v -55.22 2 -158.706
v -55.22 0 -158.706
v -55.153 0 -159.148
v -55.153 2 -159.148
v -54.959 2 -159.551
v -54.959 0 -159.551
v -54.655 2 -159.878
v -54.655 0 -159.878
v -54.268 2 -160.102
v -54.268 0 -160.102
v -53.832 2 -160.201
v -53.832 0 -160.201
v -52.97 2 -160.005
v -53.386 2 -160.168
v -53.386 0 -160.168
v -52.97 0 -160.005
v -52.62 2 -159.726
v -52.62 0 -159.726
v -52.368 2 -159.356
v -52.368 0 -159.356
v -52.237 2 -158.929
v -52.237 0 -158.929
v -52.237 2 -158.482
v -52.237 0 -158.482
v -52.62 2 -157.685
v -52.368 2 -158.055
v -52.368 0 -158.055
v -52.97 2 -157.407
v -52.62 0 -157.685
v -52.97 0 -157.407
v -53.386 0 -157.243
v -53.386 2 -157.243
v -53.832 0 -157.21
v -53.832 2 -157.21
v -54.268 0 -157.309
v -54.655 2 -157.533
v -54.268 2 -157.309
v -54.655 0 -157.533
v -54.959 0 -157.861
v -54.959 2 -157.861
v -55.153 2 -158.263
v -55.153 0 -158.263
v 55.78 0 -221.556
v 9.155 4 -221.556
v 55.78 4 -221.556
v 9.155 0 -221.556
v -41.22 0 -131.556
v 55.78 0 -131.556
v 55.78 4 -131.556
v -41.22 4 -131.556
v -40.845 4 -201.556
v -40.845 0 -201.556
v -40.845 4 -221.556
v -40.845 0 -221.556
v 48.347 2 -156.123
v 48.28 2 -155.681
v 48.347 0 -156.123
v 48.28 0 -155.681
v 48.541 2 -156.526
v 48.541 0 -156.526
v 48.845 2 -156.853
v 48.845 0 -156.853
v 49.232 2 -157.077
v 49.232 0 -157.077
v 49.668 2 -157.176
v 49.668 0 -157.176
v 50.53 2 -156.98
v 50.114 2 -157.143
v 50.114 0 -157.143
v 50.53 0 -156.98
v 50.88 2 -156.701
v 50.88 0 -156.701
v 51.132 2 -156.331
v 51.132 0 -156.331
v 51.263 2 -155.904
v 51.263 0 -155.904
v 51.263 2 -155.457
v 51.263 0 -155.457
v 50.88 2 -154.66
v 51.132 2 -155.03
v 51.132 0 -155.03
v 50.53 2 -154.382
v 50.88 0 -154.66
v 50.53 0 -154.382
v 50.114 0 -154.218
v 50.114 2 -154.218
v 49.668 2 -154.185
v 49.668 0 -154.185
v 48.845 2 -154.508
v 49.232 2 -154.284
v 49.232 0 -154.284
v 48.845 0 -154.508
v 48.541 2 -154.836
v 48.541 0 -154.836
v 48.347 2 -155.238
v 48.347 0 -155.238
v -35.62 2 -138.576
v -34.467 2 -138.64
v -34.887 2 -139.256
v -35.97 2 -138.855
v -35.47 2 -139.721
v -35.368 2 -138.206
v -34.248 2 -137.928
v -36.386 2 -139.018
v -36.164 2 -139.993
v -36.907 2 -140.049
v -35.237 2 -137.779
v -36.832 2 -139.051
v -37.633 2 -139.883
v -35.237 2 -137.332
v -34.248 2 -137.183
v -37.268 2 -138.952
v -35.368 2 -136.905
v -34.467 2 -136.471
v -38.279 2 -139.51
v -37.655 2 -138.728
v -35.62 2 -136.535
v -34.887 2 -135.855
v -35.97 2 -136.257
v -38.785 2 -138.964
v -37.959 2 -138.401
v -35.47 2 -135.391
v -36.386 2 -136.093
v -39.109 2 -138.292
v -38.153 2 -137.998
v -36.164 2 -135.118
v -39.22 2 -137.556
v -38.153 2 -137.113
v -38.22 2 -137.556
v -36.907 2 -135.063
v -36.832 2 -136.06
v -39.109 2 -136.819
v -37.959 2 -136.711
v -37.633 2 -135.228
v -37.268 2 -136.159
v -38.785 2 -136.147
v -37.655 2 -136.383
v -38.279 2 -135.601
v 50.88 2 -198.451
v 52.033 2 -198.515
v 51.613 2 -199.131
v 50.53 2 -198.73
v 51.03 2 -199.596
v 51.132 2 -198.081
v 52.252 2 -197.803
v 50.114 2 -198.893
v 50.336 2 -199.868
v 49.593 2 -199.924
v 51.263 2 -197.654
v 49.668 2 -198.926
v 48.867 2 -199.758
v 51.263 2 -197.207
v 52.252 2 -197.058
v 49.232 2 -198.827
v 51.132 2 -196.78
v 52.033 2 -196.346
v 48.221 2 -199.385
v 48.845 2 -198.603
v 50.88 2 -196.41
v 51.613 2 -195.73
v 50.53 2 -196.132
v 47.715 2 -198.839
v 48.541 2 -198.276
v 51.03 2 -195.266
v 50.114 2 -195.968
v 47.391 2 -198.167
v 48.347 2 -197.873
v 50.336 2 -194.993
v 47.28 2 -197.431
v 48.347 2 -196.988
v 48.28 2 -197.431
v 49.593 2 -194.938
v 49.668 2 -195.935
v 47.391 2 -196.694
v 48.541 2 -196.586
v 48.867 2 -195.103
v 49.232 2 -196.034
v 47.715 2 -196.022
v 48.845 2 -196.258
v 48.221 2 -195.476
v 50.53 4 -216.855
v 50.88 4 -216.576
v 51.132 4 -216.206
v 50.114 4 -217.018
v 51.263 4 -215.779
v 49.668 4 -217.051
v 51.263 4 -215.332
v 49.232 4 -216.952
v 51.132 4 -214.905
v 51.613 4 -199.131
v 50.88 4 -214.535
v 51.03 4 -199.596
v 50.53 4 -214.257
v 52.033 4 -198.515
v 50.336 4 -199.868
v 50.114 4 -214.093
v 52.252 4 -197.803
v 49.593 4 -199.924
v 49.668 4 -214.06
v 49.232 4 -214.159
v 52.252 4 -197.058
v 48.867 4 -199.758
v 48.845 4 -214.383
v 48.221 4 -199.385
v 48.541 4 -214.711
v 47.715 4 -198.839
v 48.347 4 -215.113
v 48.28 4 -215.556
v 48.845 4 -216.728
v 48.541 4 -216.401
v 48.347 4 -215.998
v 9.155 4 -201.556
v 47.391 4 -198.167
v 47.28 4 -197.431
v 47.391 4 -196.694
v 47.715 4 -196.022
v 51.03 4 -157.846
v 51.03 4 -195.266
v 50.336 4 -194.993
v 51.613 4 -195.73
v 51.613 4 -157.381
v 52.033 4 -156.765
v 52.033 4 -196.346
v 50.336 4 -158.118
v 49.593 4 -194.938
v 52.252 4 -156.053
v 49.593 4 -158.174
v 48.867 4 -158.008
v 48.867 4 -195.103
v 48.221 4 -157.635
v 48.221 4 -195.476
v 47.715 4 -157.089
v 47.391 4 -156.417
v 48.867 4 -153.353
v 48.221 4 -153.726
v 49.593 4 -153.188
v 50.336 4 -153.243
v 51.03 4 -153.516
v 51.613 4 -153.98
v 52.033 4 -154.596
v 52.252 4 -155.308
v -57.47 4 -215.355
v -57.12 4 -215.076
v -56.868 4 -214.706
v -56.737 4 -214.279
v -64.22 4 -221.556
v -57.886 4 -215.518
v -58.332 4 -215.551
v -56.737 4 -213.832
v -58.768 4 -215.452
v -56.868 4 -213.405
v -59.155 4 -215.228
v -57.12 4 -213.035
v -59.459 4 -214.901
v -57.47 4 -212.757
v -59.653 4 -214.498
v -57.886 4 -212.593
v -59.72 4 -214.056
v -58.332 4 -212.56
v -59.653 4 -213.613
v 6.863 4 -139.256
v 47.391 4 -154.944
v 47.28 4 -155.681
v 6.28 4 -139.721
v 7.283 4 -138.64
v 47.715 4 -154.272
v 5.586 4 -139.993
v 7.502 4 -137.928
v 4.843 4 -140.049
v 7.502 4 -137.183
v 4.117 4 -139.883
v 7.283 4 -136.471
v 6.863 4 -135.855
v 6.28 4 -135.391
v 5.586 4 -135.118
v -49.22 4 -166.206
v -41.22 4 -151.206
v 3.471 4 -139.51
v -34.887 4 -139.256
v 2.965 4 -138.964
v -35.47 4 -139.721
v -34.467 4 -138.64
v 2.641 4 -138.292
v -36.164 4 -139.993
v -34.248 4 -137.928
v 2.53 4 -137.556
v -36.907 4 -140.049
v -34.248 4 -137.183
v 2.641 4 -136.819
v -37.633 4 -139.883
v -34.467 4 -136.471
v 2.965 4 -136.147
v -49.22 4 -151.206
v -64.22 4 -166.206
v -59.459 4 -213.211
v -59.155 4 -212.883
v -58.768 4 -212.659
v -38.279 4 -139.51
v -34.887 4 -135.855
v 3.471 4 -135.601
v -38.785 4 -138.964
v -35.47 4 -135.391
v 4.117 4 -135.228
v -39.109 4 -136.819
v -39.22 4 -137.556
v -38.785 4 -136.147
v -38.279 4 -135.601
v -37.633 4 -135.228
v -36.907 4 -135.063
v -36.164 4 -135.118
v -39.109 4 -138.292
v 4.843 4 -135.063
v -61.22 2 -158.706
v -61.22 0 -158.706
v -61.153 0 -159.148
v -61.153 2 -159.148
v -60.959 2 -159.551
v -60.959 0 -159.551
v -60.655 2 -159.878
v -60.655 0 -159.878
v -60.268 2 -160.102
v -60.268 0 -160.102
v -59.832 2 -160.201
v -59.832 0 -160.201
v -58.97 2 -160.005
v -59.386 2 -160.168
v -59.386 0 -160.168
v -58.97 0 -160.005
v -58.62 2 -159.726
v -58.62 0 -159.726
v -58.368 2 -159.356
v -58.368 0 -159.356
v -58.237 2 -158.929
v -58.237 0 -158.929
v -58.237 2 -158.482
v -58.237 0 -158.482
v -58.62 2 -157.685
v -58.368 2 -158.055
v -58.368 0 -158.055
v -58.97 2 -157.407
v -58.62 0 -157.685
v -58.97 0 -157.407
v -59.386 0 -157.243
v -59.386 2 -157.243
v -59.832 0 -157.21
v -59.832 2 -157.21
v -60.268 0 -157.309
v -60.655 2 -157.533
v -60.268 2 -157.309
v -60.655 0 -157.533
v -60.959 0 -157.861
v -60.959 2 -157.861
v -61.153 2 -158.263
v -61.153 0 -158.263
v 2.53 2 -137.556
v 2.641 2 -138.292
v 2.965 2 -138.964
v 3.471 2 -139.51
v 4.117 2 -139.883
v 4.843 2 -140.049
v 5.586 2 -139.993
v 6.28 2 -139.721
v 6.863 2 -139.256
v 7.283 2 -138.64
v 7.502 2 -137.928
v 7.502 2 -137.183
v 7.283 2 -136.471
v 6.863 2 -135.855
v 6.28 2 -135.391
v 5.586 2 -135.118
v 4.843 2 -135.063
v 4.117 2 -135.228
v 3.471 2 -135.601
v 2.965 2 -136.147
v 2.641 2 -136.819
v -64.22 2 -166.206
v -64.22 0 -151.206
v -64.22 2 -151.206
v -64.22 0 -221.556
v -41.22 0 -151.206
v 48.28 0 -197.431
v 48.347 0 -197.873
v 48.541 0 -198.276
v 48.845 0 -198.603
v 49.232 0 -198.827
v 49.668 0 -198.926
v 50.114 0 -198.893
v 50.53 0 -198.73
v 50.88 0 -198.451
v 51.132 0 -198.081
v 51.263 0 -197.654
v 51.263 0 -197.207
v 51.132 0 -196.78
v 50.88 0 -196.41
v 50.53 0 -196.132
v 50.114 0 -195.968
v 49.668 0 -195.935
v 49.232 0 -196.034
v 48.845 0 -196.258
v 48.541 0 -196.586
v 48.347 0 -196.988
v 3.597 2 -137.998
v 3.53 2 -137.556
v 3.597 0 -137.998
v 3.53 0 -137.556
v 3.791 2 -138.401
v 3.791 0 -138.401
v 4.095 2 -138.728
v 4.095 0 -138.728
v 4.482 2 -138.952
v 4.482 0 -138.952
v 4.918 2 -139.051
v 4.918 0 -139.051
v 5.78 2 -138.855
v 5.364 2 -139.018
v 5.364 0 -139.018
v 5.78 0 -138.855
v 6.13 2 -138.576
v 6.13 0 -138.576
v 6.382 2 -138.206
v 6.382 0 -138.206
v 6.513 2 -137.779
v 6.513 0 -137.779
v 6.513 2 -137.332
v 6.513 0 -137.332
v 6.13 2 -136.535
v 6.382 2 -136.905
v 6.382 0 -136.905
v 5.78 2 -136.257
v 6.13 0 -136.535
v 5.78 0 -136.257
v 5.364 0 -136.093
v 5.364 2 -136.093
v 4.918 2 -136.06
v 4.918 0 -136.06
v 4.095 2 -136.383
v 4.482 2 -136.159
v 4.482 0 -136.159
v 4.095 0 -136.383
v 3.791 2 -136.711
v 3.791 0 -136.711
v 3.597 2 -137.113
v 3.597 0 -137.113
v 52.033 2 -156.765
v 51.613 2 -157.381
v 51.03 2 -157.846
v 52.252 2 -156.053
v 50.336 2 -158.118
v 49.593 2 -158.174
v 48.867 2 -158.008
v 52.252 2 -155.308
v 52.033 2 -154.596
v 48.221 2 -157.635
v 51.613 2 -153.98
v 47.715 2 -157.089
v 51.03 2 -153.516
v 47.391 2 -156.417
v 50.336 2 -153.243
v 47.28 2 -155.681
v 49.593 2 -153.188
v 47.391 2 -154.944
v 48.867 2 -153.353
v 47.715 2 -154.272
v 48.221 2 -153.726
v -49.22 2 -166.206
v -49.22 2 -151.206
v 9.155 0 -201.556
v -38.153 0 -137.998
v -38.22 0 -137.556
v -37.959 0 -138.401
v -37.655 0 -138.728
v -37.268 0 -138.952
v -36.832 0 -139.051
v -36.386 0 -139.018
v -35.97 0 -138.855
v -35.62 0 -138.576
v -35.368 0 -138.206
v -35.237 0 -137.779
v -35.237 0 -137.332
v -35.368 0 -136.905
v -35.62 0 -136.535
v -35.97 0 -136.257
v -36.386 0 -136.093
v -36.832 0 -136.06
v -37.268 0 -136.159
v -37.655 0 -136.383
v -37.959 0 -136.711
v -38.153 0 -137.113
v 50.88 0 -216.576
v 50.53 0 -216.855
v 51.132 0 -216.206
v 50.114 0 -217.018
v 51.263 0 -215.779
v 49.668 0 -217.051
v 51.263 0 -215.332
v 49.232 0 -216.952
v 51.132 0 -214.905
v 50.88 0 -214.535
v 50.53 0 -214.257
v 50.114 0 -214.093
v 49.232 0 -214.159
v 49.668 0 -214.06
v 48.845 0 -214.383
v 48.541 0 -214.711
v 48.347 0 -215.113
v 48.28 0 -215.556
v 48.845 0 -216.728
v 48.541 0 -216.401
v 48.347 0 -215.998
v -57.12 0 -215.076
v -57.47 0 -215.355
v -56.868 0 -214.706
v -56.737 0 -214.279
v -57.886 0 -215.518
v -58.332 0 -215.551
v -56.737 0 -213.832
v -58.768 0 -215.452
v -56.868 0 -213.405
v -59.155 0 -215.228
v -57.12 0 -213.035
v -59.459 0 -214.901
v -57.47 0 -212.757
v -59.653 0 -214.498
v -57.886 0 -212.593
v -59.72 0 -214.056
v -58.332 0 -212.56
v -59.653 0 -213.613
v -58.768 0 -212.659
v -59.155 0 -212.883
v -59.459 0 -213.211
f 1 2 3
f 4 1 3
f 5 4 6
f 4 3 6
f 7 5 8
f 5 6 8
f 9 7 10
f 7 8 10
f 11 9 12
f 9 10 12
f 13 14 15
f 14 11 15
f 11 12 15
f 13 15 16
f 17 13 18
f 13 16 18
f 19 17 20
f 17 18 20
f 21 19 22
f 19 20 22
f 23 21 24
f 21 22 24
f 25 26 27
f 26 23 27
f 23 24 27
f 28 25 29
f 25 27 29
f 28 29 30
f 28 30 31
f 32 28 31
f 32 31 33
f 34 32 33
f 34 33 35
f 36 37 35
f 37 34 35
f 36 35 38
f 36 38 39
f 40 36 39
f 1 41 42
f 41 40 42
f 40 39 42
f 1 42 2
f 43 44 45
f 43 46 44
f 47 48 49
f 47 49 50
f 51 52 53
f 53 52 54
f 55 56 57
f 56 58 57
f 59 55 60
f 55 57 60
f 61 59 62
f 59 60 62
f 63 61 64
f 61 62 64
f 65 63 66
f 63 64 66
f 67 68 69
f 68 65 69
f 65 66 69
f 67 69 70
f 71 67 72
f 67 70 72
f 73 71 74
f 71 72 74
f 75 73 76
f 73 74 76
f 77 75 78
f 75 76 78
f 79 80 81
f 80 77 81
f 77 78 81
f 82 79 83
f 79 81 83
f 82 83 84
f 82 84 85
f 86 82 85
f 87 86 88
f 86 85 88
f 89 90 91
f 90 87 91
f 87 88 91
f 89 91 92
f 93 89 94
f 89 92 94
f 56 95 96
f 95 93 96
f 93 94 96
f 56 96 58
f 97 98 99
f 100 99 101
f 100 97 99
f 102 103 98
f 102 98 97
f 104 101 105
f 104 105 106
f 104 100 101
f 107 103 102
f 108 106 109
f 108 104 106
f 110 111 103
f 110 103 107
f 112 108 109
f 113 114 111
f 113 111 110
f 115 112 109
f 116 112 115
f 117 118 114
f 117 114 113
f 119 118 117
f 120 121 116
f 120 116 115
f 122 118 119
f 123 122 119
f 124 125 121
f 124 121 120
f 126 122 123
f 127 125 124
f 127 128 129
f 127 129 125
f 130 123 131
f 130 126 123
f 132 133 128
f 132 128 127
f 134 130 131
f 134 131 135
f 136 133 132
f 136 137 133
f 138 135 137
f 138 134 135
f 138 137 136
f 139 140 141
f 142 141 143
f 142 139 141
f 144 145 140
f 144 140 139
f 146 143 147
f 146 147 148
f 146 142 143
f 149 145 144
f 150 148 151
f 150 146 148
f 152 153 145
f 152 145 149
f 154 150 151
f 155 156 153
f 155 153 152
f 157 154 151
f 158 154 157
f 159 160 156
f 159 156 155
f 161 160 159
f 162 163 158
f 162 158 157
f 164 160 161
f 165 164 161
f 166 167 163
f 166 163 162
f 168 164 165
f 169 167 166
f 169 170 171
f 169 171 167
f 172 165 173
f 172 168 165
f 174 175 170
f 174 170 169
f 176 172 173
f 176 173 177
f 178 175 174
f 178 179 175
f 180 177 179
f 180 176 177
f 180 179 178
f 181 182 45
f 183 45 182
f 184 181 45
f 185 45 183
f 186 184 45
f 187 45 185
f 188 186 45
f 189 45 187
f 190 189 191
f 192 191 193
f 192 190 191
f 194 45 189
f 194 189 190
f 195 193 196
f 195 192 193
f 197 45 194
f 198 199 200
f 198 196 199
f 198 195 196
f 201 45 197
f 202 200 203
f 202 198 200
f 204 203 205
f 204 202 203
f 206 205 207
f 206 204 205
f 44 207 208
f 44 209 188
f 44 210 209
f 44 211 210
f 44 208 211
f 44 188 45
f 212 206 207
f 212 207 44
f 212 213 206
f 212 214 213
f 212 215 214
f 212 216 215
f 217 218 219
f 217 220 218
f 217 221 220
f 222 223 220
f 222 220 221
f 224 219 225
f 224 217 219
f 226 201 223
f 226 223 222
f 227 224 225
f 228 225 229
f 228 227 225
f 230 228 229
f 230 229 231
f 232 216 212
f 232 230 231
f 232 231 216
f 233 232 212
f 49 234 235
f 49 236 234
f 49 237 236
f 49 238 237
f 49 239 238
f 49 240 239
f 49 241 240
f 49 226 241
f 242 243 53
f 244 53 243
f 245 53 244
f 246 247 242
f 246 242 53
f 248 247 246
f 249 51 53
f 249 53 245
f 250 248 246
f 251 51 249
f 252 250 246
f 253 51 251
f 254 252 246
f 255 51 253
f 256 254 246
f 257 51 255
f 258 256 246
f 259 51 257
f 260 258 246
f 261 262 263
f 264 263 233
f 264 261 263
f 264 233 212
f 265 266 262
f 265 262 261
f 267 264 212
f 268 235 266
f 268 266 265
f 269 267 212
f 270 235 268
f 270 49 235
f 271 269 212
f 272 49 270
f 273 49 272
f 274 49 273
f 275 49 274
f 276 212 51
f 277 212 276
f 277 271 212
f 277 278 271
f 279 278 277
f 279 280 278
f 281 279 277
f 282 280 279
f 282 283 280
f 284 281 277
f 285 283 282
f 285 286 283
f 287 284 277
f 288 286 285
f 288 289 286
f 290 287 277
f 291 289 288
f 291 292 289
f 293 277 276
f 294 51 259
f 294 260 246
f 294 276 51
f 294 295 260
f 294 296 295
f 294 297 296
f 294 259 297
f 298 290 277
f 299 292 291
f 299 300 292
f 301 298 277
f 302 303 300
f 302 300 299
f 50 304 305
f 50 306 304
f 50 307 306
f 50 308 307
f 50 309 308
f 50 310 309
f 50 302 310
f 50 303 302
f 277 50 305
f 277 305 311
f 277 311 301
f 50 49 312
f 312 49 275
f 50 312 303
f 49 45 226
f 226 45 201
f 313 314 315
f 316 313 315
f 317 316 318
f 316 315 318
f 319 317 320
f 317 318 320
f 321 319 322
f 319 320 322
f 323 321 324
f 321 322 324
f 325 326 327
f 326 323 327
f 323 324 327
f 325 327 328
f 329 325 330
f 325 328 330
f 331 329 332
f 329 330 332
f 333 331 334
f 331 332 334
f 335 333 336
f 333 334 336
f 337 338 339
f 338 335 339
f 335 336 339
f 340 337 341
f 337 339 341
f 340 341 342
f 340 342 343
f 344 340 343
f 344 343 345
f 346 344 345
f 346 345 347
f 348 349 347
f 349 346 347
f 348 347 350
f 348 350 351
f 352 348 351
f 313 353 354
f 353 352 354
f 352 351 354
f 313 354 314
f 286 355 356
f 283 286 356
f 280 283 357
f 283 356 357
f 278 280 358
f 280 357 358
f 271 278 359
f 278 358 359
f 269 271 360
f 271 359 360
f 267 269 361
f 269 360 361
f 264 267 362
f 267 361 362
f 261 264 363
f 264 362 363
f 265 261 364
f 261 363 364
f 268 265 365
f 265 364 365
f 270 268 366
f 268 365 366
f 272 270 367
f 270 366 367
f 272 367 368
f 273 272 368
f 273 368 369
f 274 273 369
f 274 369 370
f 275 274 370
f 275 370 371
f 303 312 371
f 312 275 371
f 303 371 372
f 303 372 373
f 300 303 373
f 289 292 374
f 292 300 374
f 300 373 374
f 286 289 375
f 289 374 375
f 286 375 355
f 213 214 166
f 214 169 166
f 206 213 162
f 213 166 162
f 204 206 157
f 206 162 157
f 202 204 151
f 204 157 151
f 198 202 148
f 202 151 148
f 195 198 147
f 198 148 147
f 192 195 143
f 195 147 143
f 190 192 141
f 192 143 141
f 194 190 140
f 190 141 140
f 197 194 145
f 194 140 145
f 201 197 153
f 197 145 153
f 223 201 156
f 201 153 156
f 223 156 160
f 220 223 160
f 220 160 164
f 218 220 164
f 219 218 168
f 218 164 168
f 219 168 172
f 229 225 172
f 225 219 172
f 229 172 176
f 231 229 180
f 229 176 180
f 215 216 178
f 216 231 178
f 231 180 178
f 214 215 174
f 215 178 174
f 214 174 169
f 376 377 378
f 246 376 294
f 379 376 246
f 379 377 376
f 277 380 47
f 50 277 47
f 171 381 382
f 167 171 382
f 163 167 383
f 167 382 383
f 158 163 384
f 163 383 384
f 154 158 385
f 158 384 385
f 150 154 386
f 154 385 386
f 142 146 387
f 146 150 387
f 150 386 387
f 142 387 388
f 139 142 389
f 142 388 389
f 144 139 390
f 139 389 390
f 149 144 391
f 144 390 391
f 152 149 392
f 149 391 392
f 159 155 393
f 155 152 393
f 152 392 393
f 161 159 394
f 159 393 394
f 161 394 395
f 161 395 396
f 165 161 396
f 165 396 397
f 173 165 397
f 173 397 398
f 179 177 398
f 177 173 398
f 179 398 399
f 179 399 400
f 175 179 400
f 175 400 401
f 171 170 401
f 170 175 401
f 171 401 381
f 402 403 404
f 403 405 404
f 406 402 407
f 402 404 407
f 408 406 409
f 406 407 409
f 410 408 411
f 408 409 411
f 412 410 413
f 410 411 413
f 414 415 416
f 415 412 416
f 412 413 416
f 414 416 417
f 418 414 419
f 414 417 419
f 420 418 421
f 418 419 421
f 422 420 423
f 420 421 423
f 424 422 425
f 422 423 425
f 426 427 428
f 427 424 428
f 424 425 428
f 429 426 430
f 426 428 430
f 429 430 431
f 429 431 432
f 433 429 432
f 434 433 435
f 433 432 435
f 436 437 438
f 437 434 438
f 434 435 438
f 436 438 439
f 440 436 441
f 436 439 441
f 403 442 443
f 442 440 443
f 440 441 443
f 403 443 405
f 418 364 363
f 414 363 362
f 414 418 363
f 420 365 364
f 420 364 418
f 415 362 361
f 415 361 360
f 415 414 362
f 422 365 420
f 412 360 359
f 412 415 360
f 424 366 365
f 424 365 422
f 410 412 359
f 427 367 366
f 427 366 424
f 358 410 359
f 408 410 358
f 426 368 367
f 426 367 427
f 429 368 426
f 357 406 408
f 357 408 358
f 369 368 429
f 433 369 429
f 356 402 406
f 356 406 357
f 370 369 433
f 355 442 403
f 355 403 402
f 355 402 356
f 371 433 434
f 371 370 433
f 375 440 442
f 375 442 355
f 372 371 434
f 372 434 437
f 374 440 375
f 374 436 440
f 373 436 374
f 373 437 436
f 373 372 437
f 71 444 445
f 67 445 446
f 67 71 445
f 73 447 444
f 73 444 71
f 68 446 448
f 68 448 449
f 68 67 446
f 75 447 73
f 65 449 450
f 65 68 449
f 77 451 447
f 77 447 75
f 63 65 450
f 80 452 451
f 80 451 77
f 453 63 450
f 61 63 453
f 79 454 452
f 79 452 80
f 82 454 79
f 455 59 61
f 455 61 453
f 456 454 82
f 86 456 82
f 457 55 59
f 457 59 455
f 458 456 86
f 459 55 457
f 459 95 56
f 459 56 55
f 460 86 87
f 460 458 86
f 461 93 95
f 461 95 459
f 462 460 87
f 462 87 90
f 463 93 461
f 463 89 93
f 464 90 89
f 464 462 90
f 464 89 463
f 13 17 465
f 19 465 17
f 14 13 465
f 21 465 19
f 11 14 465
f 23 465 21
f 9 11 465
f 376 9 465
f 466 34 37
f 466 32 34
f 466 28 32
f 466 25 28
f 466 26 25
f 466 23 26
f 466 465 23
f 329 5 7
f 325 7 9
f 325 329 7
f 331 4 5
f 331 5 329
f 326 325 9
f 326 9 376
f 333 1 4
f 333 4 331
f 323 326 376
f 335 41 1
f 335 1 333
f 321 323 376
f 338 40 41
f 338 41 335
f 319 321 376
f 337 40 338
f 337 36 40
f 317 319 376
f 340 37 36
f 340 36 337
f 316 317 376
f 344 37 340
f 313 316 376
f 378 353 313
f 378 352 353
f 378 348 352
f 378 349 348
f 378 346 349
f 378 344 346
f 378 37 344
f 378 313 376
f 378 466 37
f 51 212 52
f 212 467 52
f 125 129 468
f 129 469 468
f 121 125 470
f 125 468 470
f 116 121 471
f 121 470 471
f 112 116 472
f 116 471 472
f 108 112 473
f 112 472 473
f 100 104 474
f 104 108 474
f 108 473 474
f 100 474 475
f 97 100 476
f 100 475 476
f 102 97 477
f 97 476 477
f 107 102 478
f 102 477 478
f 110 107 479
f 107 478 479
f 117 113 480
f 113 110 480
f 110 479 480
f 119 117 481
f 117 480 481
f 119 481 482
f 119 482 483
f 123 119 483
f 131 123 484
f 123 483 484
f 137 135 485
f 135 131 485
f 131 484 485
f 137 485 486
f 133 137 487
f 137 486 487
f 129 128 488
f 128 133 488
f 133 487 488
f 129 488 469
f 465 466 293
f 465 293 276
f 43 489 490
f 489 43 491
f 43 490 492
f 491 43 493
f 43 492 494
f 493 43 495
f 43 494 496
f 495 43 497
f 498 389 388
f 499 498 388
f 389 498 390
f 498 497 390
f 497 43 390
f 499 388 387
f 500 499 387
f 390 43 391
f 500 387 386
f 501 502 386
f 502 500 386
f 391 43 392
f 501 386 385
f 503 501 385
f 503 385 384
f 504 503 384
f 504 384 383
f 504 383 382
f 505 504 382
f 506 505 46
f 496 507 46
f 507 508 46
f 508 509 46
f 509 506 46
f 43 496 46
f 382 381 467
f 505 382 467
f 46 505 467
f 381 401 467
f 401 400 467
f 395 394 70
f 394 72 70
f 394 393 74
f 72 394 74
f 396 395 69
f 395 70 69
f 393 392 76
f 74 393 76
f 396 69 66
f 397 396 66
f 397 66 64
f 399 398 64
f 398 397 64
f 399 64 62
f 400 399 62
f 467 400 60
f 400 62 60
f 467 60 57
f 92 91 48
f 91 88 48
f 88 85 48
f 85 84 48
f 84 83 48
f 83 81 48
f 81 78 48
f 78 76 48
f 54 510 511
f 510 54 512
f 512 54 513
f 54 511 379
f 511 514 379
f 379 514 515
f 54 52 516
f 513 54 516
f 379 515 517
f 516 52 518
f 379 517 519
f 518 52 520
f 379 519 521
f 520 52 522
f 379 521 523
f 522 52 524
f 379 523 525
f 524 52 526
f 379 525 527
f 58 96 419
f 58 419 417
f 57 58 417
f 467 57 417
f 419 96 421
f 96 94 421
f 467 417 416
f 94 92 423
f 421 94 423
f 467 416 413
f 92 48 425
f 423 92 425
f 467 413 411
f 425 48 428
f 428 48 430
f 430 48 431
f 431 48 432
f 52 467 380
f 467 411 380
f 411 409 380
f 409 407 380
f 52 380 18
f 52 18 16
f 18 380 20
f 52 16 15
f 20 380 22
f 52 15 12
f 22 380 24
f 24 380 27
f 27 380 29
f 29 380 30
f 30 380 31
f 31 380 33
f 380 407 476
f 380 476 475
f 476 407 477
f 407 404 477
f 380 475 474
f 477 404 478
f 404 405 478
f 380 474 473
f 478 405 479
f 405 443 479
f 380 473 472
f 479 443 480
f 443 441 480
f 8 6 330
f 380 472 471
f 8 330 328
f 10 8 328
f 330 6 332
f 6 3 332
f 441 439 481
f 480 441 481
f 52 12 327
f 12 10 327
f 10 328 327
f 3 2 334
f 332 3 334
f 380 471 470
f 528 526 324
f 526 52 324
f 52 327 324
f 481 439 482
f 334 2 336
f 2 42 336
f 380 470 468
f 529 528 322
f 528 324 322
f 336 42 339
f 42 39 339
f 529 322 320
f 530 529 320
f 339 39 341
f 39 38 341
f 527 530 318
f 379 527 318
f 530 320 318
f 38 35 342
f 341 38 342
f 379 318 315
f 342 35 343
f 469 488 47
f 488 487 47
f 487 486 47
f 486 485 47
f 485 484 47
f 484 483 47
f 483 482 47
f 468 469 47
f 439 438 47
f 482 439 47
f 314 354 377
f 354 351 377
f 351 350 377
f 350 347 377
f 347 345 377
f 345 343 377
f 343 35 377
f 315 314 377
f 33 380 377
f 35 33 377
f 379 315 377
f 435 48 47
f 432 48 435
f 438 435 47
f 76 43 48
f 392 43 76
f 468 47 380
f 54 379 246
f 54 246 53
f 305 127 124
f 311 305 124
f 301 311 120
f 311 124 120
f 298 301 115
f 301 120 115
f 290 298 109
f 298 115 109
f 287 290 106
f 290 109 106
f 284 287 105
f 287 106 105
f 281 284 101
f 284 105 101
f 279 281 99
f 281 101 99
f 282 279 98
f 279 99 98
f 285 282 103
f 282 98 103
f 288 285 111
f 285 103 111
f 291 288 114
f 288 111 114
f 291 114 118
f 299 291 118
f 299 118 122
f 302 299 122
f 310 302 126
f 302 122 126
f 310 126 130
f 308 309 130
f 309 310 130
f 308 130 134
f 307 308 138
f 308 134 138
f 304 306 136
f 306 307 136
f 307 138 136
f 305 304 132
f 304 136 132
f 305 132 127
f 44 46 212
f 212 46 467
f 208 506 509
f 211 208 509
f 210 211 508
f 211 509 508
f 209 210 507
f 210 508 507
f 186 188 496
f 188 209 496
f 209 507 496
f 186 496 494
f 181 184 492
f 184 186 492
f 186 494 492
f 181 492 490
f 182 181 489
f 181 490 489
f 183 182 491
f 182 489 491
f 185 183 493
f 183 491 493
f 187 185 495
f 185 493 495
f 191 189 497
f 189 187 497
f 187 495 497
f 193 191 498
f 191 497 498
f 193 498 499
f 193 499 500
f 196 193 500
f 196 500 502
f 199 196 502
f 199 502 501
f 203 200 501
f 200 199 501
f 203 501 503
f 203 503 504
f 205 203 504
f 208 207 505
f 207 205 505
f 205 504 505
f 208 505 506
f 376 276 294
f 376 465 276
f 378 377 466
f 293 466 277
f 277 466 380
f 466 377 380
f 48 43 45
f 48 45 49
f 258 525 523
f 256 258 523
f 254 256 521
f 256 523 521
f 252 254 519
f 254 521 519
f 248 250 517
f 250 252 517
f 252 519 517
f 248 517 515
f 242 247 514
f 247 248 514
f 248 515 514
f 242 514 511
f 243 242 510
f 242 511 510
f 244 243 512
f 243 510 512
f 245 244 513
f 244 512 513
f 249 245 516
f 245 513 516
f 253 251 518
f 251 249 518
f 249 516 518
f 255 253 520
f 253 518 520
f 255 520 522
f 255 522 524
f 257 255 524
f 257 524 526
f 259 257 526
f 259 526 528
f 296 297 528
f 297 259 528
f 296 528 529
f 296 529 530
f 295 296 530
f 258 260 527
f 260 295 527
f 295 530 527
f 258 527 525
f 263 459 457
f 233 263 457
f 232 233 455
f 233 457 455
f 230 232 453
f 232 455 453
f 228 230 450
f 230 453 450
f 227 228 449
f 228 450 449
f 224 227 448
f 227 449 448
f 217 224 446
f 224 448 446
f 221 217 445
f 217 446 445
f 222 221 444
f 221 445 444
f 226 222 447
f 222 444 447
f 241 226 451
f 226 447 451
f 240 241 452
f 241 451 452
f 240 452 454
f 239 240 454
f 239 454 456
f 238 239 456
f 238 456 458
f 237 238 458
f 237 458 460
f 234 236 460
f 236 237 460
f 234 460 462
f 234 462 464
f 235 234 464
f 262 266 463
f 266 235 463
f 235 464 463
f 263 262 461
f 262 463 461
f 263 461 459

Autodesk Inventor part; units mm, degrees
ref_plane "YZ Plane" through (0, 0, 0) normal (1, 0, 0) x (0, 1, 0)
ref_plane "XZ Plane" through (0, 0, 0) normal (0, 1, 0) x (-1, 0, 0)
ref_plane "XY Plane" through (0, 0, 0) normal (0, 0, 1) x (1, 0, 0)
sketch "Sketch1" plane through (0, 0, 0) normal (0, 1, 0) x (-1, 0, 0)
  line L0 (64.2199, -131.5556) -> (64.2199, -221.5556)
  line L1 (3.3449, -196.5556) -> (3.3449, -176.5556)
  circle A0 centre (9.8449, -186.5556) radius 1.5
  line L2 (-9.1551, -221.5556) -> (-9.1551, -201.5556)
  circle A1 centre (21.8449, -186.5556) radius 1.5
  line L3 (3.3449, -176.5556) -> (28.3449, -176.5556)
  line L4 (28.3449, -196.5556) -> (3.3449, -196.5556)
  line L5 (28.3449, -176.5556) -> (28.3449, -196.5556)
  line L6 (64.2199, -221.5556) -> (-55.7801, -221.5556)
  line L7 (-9.1551, -201.5556) -> (40.8449, -201.5556)
  line L8 (40.8449, -221.5556) -> (-9.1551, -221.5556)
  circle A2 centre (58.2199, -214.0556) radius 1.5
  line L9 (40.8449, -201.5556) -> (40.8449, -221.5556)
  line L10 (30.8449, -173.5556) -> (15.8449, -173.5556)
  line L11 (15.8449, -173.5556) -> (15.8449, -143.5556)
  line L12 (15.8449, -143.5556) -> (30.8449, -143.5556)
  line L13 (30.8449, -143.5556) -> (30.8449, -173.5556)
  line L14 (0.8449, -173.5556) -> (15.8449, -173.5556)
  circle A3 centre (8.3449, -164.5556) radius 1.5
  circle A4 centre (8.3449, -152.5556) radius 1.5
  circle A5 centre (23.3449, -164.5556) radius 1.5
  line L15 (0.8449, -143.5556) -> (0.8449, -173.5556)
  line L16 (15.8449, -173.5556) -> (15.8449, -143.5556)
  line L17 (15.8449, -143.5556) -> (0.8449, -143.5556)
  circle A6 centre (23.3449, -152.5556) radius 1.5
  line L18 (49.2199, -166.2056) -> (64.2199, -166.2056)
  circle A7 centre (53.7199, -158.7056) radius 1.5
  circle A8 centre (53.7199, -158.7056) radius 2.5
  circle A9 centre (59.7199, -158.7056) radius 1.5
  circle A10 centre (59.7199, -158.7056) radius 2.5
  line L19 (49.2199, -151.2056) -> (49.2199, -166.2056)
  line L20 (64.2199, -166.2056) -> (64.2199, -151.2056)
  line L21 (64.2199, -151.2056) -> (49.2199, -151.2056)
  line L22 (64.2199, -148.5556) -> (64.2199, -131.5556)
  line L23 (64.2199, -131.5556) -> (49.2199, -131.5556)
  line L24 (-55.7801, -221.5556) -> (-55.7801, -131.5556)
  line L25 (-55.7801, -131.5556) -> (-6.8176, -131.5556)
  line L26 (-55.7801, -176.5556) -> (-55.7801, -171.5556)
  line L27 (-55.7801, -171.5556) -> (-55.7801, -181.5556)
  circle A11 centre (-49.7801, -215.5556) radius 1.5
  circle A12 centre (-49.7801, -155.6806) radius 1.5
  circle A13 centre (-49.7801, -155.6806) radius 2.5
  line L28 (-41.5051, -176.5556) -> (-60.5551, -176.5556) construction
  circle A14 centre (-49.7801, -197.4306) radius 2.5
  circle A15 centre (-49.7801, -197.4306) radius 1.5
  line L29 (3.1824, -131.5556) -> (64.2199, -131.5556)
  circle A16 centre (36.7199, -137.5556) radius 2.5
  circle A17 centre (36.7199, -137.5556) radius 1.5
  line L30 (3.1824, -131.5556) -> (-6.8176, -131.5556)
  circle A18 centre (-5.0301, -137.5556) radius 1.5
  circle A19 centre (-5.0301, -137.5556) radius 2.5
  line L31 (15.8449, -176.5556) -> (15.8449, -139.0556) construction
  line L32 (49.2199, -151.2056) -> (41.2199, -151.2056)
  line L33 (41.2199, -151.2056) -> (41.2199, -131.5556)
  point P0 (0, -174.625)
  point P1 (-1.8176, -176.5556)
  point P2 (3.3449, -186.5556)
  point P3 (36.7199, -143.5556)
  point P4 (-5.0301, -143.5556)
  point P5 (-9.1551, -221.5556)
  point P6 (44.2199, -131.5556)
  dimension "d32" = 12
  dimension "d33" = 7.5
  dimension "d34" = 7.5
  dimension "d35" = 12
  dimension "d36" = 0
  dimension "d37" = 0
  dimension "d39" = 8
extrude "Extrusion1" add sketch "Sketch1" along normal blind 4 contours L33 L32 L19 L18 L0 L6 L9 L7 L2 L24 L25 L30 L29 | L1 L3 L5 L4 | A0 | A1 | L10 L11 L12 L13 | L14 L15 L17 L11 | A3 | A4 | A5 | A6
extrude "Extrusion2" add sketch "Sketch1" along normal blind 2 contours L0 L18 L19 L21 | L1 L3 L5 L4 | L10 L11 L12 L13 | L14 L15 L17 L11 | A8 | A10 | A13 | A14 | A16 | A19
properties part number "Casis Kanan Atas_3DPrint"
